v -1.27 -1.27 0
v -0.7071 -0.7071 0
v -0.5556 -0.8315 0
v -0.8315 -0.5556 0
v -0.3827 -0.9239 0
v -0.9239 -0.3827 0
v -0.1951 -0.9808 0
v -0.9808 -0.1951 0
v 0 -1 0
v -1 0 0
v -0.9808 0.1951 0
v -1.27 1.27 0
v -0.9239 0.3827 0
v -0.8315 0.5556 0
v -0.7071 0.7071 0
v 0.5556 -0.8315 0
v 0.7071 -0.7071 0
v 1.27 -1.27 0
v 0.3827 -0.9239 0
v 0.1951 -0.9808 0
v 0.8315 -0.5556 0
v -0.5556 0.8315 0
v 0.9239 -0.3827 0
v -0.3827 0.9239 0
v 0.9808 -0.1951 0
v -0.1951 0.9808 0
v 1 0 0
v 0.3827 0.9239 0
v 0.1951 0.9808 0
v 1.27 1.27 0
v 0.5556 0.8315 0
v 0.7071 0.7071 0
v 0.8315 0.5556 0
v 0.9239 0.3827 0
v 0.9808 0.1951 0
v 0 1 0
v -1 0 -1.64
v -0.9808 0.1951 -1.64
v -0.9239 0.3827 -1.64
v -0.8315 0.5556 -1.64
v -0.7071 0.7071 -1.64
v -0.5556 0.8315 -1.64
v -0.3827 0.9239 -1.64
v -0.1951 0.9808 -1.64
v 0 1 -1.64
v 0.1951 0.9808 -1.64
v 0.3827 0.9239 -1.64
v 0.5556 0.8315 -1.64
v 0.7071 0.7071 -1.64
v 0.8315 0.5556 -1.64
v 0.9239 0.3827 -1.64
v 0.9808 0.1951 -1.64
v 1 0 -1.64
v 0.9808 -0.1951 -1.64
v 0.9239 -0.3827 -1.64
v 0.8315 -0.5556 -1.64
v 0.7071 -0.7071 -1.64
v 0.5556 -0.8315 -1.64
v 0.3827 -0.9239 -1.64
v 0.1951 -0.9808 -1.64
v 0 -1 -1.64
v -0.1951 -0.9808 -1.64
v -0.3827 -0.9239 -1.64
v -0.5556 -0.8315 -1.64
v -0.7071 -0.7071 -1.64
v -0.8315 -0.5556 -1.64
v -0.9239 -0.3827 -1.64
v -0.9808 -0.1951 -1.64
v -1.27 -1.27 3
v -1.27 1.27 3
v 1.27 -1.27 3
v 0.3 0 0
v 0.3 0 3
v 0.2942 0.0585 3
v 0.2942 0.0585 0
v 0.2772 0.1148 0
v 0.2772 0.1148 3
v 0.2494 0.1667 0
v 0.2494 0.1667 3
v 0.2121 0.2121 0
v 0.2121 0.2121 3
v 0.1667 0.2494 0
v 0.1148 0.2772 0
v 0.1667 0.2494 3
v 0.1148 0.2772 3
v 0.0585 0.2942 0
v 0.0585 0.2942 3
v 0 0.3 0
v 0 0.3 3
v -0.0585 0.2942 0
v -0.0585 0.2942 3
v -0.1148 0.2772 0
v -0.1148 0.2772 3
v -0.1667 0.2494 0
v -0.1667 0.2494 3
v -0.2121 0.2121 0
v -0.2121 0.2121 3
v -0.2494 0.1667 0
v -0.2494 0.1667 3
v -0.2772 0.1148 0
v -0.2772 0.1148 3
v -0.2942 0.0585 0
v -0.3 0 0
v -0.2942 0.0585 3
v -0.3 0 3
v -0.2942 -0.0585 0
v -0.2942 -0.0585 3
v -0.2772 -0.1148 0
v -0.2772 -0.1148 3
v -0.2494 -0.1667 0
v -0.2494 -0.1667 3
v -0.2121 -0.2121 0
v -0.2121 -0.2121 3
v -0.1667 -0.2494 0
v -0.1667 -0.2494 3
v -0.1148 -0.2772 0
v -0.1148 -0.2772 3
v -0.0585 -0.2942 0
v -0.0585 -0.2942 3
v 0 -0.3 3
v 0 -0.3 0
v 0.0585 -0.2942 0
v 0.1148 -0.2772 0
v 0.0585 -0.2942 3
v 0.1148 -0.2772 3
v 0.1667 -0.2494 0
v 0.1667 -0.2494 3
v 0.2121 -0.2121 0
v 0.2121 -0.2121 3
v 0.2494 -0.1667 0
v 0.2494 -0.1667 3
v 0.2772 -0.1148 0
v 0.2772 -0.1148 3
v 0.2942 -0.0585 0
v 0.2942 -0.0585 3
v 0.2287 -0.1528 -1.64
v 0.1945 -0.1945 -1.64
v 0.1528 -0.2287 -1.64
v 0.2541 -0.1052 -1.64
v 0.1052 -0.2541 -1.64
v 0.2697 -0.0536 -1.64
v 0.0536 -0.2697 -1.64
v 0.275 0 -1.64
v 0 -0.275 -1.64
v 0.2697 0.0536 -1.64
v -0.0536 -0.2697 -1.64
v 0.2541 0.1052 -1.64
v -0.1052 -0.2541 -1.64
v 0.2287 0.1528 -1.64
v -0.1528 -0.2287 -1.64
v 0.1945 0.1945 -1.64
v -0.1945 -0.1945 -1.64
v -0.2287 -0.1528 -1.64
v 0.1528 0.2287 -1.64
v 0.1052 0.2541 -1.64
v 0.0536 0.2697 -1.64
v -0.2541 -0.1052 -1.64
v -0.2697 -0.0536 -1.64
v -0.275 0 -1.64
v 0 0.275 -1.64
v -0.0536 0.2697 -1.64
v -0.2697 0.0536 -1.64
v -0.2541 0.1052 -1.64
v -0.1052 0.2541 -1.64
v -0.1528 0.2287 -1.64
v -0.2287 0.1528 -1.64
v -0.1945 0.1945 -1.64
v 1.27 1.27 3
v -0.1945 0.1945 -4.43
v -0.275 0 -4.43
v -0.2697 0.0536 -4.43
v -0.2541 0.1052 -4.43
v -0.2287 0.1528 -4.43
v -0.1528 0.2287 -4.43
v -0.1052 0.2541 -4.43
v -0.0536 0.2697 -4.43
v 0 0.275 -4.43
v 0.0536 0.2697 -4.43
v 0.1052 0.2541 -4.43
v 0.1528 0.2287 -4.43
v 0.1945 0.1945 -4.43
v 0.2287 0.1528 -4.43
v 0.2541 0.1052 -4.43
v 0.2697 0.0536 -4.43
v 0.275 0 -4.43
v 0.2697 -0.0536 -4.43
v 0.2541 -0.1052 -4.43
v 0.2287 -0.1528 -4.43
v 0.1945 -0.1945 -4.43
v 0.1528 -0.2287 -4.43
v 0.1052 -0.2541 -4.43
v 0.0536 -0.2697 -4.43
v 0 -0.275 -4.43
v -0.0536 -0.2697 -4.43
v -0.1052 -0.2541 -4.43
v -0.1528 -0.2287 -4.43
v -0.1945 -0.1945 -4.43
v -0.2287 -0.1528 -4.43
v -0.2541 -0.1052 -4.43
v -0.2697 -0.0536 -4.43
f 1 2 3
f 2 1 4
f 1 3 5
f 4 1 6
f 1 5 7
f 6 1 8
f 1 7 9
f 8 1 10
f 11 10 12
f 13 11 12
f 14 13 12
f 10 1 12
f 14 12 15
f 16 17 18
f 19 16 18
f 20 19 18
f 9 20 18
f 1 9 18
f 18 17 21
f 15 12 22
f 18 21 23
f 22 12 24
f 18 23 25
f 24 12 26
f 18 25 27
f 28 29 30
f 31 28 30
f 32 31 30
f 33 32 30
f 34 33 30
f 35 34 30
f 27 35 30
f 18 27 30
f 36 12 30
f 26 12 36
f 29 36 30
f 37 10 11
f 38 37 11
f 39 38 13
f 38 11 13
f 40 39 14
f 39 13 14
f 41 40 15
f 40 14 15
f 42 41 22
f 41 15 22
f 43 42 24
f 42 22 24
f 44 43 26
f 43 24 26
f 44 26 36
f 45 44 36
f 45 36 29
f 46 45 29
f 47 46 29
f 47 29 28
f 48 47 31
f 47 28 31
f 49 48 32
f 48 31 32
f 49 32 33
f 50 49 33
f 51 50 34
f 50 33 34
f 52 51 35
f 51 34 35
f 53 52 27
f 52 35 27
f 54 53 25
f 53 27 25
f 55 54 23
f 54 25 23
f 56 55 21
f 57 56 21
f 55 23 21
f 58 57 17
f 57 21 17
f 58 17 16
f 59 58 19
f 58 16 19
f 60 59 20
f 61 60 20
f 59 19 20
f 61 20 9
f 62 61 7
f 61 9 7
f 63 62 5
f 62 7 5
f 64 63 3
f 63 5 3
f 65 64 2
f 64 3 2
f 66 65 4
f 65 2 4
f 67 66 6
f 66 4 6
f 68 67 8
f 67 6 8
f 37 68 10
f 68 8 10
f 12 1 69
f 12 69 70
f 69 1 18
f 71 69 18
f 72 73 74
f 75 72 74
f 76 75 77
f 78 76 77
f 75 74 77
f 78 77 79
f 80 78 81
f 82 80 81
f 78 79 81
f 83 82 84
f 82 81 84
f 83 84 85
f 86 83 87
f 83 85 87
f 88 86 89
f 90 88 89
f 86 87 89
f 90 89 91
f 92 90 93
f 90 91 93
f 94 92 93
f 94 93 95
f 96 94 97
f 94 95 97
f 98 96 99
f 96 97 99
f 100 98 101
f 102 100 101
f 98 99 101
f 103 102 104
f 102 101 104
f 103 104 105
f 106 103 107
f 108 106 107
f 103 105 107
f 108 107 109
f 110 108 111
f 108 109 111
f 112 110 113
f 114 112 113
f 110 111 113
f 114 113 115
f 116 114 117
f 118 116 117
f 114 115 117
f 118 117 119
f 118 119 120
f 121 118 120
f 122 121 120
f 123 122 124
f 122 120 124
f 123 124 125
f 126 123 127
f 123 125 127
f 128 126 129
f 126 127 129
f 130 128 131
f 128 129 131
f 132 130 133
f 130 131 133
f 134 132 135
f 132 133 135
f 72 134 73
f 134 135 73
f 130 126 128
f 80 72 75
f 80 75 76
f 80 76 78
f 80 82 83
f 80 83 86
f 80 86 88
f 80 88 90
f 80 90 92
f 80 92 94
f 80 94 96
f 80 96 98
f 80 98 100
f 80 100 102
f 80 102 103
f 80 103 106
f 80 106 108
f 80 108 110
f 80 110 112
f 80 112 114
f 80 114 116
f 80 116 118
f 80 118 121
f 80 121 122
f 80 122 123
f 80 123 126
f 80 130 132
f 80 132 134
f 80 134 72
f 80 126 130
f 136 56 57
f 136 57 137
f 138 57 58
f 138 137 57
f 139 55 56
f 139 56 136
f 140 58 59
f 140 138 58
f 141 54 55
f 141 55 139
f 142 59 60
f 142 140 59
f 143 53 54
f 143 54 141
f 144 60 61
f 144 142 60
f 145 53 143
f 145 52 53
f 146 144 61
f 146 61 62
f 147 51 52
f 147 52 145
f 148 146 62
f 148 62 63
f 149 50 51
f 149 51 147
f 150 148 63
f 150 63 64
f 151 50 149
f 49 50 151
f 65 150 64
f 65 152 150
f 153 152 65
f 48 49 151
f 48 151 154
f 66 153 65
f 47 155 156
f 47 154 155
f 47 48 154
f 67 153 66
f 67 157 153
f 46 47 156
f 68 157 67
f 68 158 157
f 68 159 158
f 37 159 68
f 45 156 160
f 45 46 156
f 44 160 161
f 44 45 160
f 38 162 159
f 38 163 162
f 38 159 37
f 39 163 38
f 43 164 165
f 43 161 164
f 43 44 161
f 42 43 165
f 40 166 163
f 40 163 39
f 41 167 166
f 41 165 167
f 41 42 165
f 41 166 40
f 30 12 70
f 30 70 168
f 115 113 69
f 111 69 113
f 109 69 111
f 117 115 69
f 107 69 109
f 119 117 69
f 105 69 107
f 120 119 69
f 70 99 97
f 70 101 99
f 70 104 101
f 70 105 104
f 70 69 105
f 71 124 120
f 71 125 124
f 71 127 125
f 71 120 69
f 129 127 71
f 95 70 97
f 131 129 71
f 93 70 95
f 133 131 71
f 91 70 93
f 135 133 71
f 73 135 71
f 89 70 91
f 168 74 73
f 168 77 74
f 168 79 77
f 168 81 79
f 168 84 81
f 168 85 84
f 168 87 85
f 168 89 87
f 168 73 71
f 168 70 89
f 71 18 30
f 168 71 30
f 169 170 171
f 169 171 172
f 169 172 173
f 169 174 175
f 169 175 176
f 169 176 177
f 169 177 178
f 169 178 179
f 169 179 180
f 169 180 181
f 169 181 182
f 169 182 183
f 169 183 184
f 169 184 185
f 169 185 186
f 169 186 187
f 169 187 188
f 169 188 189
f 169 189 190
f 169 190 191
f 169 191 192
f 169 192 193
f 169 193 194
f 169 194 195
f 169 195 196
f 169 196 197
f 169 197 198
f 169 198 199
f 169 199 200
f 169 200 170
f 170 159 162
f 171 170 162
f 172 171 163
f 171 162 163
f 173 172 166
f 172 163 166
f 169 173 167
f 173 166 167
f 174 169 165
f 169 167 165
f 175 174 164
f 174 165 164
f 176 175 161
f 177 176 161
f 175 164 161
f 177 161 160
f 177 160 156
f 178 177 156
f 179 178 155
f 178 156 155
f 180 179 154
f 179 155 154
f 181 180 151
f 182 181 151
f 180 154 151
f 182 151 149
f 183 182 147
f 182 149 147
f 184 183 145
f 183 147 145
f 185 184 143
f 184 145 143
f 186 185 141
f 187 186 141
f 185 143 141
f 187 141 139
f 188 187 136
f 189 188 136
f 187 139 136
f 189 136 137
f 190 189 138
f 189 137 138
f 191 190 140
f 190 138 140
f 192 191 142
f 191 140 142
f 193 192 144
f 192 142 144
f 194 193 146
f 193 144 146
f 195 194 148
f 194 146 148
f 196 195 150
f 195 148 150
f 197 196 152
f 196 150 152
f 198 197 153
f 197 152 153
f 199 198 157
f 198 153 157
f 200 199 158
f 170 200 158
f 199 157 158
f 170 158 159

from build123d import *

# Parameters (mm, degrees)
SKETCH1_W           = 2.54
SKETCH1_H           = 2.54
BOSS_EXTRUDE1_DEPTH = 3
SKETCH2_R           = 1
BOSS_EXTRUDE2_DEPTH = 1.64
SKETCH3_R           = 0.275
BOSS_EXTRUDE3_DEPTH = 2.79
SKETCH4_R           = 0.3
CUT_EXTRUDE1_DEPTH  = 3


with BuildPart() as part:
    # Sketch1 → Boss-Extrude1 (new body)
    with BuildSketch(Plane.XY):
        Rectangle(SKETCH1_W, SKETCH1_H)
    extrude(amount=BOSS_EXTRUDE1_DEPTH)

    # Sketch2 → Boss-Extrude2 (add)
    with BuildSketch(Plane(origin=(0, 0, 0), x_dir=(-1, 0, 0), z_dir=(0, 0, -1))):
        Circle(SKETCH2_R)
    extrude(amount=BOSS_EXTRUDE2_DEPTH)

    # Sketch3 → Boss-Extrude3 (add)
    with BuildSketch(Plane(origin=(0, 0, -1.64), x_dir=(-1, 0, 0), z_dir=(0, 0, -1))):
        Circle(SKETCH3_R)
    extrude(amount=BOSS_EXTRUDE3_DEPTH)

    # Sketch4 → Cut-Extrude1 (cut)
    with BuildSketch(Plane.XY.offset(3)):
        Circle(SKETCH4_R)
    extrude(amount=-CUT_EXTRUDE1_DEPTH, mode=Mode.SUBTRACT)


solid = part.part
